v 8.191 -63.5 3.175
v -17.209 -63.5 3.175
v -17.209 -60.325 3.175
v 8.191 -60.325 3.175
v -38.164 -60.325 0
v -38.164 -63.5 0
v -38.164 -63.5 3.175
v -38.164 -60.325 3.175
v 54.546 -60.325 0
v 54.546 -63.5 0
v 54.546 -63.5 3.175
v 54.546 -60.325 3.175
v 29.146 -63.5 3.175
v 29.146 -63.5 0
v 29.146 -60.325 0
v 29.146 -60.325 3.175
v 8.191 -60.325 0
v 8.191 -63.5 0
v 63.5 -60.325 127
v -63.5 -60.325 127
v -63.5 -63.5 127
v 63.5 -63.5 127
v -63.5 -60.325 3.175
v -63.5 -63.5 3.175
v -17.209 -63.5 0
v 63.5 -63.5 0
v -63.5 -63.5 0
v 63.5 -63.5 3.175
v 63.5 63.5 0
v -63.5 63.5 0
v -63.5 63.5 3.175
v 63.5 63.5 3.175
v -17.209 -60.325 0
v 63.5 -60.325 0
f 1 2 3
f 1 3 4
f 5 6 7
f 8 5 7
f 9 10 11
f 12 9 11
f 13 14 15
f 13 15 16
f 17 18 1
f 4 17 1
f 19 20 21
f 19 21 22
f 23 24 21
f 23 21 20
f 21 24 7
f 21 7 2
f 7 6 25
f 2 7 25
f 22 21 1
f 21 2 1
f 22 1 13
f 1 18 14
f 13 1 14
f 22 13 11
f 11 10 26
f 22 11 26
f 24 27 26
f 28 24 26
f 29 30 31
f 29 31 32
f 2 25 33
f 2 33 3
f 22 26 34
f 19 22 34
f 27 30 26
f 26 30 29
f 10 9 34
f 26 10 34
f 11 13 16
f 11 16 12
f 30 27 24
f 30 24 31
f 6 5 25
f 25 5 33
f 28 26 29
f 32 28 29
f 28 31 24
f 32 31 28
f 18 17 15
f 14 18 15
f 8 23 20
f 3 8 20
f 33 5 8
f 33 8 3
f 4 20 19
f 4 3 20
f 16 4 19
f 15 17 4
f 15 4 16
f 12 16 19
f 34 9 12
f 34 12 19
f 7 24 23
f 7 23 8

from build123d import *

# Parameters (mm, degrees)
F0_W     = 127
F0_H     = 127
F1_DEPTH = 3.175
F2_W     = 127
F2_H     = 3.175
F3_DEPTH = 127
F4_W     = 25.3358542953
F4_H     = 3.175
F4_W_2   = 25.4
F5_DEPTH = 25.4


with BuildPart() as f1:
    # F0 (on Top) → F1 (new body)
    with BuildSketch(Plane.XY):
        Rectangle(F0_W, F0_H)
    extrude(amount=F1_DEPTH)


with BuildPart() as f3:
    # F2 (on Top) → F3 (new body)
    with BuildSketch(Plane.XY):
        with Locations((0, -61.9125)):
            Rectangle(F2_W, F2_H)
    extrude(amount=F3_DEPTH)

    # F4 (on face) → F5 (cut)
    with BuildSketch(Plane.XZ.offset(63.5)):
        with Locations((-50.8320728524, 1.5875)):
            Rectangle(F4_W, F4_H)
        with Locations((-4.5091457047, 1.5875)):
            Rectangle(F4_W_2, F4_H)
        with Locations((41.8458542953, 1.5875)):
            Rectangle(F4_W_2, F4_H)
    extrude(amount=-F5_DEPTH, mode=Mode.SUBTRACT)


solid = Compound([f1.part, f3.part])
